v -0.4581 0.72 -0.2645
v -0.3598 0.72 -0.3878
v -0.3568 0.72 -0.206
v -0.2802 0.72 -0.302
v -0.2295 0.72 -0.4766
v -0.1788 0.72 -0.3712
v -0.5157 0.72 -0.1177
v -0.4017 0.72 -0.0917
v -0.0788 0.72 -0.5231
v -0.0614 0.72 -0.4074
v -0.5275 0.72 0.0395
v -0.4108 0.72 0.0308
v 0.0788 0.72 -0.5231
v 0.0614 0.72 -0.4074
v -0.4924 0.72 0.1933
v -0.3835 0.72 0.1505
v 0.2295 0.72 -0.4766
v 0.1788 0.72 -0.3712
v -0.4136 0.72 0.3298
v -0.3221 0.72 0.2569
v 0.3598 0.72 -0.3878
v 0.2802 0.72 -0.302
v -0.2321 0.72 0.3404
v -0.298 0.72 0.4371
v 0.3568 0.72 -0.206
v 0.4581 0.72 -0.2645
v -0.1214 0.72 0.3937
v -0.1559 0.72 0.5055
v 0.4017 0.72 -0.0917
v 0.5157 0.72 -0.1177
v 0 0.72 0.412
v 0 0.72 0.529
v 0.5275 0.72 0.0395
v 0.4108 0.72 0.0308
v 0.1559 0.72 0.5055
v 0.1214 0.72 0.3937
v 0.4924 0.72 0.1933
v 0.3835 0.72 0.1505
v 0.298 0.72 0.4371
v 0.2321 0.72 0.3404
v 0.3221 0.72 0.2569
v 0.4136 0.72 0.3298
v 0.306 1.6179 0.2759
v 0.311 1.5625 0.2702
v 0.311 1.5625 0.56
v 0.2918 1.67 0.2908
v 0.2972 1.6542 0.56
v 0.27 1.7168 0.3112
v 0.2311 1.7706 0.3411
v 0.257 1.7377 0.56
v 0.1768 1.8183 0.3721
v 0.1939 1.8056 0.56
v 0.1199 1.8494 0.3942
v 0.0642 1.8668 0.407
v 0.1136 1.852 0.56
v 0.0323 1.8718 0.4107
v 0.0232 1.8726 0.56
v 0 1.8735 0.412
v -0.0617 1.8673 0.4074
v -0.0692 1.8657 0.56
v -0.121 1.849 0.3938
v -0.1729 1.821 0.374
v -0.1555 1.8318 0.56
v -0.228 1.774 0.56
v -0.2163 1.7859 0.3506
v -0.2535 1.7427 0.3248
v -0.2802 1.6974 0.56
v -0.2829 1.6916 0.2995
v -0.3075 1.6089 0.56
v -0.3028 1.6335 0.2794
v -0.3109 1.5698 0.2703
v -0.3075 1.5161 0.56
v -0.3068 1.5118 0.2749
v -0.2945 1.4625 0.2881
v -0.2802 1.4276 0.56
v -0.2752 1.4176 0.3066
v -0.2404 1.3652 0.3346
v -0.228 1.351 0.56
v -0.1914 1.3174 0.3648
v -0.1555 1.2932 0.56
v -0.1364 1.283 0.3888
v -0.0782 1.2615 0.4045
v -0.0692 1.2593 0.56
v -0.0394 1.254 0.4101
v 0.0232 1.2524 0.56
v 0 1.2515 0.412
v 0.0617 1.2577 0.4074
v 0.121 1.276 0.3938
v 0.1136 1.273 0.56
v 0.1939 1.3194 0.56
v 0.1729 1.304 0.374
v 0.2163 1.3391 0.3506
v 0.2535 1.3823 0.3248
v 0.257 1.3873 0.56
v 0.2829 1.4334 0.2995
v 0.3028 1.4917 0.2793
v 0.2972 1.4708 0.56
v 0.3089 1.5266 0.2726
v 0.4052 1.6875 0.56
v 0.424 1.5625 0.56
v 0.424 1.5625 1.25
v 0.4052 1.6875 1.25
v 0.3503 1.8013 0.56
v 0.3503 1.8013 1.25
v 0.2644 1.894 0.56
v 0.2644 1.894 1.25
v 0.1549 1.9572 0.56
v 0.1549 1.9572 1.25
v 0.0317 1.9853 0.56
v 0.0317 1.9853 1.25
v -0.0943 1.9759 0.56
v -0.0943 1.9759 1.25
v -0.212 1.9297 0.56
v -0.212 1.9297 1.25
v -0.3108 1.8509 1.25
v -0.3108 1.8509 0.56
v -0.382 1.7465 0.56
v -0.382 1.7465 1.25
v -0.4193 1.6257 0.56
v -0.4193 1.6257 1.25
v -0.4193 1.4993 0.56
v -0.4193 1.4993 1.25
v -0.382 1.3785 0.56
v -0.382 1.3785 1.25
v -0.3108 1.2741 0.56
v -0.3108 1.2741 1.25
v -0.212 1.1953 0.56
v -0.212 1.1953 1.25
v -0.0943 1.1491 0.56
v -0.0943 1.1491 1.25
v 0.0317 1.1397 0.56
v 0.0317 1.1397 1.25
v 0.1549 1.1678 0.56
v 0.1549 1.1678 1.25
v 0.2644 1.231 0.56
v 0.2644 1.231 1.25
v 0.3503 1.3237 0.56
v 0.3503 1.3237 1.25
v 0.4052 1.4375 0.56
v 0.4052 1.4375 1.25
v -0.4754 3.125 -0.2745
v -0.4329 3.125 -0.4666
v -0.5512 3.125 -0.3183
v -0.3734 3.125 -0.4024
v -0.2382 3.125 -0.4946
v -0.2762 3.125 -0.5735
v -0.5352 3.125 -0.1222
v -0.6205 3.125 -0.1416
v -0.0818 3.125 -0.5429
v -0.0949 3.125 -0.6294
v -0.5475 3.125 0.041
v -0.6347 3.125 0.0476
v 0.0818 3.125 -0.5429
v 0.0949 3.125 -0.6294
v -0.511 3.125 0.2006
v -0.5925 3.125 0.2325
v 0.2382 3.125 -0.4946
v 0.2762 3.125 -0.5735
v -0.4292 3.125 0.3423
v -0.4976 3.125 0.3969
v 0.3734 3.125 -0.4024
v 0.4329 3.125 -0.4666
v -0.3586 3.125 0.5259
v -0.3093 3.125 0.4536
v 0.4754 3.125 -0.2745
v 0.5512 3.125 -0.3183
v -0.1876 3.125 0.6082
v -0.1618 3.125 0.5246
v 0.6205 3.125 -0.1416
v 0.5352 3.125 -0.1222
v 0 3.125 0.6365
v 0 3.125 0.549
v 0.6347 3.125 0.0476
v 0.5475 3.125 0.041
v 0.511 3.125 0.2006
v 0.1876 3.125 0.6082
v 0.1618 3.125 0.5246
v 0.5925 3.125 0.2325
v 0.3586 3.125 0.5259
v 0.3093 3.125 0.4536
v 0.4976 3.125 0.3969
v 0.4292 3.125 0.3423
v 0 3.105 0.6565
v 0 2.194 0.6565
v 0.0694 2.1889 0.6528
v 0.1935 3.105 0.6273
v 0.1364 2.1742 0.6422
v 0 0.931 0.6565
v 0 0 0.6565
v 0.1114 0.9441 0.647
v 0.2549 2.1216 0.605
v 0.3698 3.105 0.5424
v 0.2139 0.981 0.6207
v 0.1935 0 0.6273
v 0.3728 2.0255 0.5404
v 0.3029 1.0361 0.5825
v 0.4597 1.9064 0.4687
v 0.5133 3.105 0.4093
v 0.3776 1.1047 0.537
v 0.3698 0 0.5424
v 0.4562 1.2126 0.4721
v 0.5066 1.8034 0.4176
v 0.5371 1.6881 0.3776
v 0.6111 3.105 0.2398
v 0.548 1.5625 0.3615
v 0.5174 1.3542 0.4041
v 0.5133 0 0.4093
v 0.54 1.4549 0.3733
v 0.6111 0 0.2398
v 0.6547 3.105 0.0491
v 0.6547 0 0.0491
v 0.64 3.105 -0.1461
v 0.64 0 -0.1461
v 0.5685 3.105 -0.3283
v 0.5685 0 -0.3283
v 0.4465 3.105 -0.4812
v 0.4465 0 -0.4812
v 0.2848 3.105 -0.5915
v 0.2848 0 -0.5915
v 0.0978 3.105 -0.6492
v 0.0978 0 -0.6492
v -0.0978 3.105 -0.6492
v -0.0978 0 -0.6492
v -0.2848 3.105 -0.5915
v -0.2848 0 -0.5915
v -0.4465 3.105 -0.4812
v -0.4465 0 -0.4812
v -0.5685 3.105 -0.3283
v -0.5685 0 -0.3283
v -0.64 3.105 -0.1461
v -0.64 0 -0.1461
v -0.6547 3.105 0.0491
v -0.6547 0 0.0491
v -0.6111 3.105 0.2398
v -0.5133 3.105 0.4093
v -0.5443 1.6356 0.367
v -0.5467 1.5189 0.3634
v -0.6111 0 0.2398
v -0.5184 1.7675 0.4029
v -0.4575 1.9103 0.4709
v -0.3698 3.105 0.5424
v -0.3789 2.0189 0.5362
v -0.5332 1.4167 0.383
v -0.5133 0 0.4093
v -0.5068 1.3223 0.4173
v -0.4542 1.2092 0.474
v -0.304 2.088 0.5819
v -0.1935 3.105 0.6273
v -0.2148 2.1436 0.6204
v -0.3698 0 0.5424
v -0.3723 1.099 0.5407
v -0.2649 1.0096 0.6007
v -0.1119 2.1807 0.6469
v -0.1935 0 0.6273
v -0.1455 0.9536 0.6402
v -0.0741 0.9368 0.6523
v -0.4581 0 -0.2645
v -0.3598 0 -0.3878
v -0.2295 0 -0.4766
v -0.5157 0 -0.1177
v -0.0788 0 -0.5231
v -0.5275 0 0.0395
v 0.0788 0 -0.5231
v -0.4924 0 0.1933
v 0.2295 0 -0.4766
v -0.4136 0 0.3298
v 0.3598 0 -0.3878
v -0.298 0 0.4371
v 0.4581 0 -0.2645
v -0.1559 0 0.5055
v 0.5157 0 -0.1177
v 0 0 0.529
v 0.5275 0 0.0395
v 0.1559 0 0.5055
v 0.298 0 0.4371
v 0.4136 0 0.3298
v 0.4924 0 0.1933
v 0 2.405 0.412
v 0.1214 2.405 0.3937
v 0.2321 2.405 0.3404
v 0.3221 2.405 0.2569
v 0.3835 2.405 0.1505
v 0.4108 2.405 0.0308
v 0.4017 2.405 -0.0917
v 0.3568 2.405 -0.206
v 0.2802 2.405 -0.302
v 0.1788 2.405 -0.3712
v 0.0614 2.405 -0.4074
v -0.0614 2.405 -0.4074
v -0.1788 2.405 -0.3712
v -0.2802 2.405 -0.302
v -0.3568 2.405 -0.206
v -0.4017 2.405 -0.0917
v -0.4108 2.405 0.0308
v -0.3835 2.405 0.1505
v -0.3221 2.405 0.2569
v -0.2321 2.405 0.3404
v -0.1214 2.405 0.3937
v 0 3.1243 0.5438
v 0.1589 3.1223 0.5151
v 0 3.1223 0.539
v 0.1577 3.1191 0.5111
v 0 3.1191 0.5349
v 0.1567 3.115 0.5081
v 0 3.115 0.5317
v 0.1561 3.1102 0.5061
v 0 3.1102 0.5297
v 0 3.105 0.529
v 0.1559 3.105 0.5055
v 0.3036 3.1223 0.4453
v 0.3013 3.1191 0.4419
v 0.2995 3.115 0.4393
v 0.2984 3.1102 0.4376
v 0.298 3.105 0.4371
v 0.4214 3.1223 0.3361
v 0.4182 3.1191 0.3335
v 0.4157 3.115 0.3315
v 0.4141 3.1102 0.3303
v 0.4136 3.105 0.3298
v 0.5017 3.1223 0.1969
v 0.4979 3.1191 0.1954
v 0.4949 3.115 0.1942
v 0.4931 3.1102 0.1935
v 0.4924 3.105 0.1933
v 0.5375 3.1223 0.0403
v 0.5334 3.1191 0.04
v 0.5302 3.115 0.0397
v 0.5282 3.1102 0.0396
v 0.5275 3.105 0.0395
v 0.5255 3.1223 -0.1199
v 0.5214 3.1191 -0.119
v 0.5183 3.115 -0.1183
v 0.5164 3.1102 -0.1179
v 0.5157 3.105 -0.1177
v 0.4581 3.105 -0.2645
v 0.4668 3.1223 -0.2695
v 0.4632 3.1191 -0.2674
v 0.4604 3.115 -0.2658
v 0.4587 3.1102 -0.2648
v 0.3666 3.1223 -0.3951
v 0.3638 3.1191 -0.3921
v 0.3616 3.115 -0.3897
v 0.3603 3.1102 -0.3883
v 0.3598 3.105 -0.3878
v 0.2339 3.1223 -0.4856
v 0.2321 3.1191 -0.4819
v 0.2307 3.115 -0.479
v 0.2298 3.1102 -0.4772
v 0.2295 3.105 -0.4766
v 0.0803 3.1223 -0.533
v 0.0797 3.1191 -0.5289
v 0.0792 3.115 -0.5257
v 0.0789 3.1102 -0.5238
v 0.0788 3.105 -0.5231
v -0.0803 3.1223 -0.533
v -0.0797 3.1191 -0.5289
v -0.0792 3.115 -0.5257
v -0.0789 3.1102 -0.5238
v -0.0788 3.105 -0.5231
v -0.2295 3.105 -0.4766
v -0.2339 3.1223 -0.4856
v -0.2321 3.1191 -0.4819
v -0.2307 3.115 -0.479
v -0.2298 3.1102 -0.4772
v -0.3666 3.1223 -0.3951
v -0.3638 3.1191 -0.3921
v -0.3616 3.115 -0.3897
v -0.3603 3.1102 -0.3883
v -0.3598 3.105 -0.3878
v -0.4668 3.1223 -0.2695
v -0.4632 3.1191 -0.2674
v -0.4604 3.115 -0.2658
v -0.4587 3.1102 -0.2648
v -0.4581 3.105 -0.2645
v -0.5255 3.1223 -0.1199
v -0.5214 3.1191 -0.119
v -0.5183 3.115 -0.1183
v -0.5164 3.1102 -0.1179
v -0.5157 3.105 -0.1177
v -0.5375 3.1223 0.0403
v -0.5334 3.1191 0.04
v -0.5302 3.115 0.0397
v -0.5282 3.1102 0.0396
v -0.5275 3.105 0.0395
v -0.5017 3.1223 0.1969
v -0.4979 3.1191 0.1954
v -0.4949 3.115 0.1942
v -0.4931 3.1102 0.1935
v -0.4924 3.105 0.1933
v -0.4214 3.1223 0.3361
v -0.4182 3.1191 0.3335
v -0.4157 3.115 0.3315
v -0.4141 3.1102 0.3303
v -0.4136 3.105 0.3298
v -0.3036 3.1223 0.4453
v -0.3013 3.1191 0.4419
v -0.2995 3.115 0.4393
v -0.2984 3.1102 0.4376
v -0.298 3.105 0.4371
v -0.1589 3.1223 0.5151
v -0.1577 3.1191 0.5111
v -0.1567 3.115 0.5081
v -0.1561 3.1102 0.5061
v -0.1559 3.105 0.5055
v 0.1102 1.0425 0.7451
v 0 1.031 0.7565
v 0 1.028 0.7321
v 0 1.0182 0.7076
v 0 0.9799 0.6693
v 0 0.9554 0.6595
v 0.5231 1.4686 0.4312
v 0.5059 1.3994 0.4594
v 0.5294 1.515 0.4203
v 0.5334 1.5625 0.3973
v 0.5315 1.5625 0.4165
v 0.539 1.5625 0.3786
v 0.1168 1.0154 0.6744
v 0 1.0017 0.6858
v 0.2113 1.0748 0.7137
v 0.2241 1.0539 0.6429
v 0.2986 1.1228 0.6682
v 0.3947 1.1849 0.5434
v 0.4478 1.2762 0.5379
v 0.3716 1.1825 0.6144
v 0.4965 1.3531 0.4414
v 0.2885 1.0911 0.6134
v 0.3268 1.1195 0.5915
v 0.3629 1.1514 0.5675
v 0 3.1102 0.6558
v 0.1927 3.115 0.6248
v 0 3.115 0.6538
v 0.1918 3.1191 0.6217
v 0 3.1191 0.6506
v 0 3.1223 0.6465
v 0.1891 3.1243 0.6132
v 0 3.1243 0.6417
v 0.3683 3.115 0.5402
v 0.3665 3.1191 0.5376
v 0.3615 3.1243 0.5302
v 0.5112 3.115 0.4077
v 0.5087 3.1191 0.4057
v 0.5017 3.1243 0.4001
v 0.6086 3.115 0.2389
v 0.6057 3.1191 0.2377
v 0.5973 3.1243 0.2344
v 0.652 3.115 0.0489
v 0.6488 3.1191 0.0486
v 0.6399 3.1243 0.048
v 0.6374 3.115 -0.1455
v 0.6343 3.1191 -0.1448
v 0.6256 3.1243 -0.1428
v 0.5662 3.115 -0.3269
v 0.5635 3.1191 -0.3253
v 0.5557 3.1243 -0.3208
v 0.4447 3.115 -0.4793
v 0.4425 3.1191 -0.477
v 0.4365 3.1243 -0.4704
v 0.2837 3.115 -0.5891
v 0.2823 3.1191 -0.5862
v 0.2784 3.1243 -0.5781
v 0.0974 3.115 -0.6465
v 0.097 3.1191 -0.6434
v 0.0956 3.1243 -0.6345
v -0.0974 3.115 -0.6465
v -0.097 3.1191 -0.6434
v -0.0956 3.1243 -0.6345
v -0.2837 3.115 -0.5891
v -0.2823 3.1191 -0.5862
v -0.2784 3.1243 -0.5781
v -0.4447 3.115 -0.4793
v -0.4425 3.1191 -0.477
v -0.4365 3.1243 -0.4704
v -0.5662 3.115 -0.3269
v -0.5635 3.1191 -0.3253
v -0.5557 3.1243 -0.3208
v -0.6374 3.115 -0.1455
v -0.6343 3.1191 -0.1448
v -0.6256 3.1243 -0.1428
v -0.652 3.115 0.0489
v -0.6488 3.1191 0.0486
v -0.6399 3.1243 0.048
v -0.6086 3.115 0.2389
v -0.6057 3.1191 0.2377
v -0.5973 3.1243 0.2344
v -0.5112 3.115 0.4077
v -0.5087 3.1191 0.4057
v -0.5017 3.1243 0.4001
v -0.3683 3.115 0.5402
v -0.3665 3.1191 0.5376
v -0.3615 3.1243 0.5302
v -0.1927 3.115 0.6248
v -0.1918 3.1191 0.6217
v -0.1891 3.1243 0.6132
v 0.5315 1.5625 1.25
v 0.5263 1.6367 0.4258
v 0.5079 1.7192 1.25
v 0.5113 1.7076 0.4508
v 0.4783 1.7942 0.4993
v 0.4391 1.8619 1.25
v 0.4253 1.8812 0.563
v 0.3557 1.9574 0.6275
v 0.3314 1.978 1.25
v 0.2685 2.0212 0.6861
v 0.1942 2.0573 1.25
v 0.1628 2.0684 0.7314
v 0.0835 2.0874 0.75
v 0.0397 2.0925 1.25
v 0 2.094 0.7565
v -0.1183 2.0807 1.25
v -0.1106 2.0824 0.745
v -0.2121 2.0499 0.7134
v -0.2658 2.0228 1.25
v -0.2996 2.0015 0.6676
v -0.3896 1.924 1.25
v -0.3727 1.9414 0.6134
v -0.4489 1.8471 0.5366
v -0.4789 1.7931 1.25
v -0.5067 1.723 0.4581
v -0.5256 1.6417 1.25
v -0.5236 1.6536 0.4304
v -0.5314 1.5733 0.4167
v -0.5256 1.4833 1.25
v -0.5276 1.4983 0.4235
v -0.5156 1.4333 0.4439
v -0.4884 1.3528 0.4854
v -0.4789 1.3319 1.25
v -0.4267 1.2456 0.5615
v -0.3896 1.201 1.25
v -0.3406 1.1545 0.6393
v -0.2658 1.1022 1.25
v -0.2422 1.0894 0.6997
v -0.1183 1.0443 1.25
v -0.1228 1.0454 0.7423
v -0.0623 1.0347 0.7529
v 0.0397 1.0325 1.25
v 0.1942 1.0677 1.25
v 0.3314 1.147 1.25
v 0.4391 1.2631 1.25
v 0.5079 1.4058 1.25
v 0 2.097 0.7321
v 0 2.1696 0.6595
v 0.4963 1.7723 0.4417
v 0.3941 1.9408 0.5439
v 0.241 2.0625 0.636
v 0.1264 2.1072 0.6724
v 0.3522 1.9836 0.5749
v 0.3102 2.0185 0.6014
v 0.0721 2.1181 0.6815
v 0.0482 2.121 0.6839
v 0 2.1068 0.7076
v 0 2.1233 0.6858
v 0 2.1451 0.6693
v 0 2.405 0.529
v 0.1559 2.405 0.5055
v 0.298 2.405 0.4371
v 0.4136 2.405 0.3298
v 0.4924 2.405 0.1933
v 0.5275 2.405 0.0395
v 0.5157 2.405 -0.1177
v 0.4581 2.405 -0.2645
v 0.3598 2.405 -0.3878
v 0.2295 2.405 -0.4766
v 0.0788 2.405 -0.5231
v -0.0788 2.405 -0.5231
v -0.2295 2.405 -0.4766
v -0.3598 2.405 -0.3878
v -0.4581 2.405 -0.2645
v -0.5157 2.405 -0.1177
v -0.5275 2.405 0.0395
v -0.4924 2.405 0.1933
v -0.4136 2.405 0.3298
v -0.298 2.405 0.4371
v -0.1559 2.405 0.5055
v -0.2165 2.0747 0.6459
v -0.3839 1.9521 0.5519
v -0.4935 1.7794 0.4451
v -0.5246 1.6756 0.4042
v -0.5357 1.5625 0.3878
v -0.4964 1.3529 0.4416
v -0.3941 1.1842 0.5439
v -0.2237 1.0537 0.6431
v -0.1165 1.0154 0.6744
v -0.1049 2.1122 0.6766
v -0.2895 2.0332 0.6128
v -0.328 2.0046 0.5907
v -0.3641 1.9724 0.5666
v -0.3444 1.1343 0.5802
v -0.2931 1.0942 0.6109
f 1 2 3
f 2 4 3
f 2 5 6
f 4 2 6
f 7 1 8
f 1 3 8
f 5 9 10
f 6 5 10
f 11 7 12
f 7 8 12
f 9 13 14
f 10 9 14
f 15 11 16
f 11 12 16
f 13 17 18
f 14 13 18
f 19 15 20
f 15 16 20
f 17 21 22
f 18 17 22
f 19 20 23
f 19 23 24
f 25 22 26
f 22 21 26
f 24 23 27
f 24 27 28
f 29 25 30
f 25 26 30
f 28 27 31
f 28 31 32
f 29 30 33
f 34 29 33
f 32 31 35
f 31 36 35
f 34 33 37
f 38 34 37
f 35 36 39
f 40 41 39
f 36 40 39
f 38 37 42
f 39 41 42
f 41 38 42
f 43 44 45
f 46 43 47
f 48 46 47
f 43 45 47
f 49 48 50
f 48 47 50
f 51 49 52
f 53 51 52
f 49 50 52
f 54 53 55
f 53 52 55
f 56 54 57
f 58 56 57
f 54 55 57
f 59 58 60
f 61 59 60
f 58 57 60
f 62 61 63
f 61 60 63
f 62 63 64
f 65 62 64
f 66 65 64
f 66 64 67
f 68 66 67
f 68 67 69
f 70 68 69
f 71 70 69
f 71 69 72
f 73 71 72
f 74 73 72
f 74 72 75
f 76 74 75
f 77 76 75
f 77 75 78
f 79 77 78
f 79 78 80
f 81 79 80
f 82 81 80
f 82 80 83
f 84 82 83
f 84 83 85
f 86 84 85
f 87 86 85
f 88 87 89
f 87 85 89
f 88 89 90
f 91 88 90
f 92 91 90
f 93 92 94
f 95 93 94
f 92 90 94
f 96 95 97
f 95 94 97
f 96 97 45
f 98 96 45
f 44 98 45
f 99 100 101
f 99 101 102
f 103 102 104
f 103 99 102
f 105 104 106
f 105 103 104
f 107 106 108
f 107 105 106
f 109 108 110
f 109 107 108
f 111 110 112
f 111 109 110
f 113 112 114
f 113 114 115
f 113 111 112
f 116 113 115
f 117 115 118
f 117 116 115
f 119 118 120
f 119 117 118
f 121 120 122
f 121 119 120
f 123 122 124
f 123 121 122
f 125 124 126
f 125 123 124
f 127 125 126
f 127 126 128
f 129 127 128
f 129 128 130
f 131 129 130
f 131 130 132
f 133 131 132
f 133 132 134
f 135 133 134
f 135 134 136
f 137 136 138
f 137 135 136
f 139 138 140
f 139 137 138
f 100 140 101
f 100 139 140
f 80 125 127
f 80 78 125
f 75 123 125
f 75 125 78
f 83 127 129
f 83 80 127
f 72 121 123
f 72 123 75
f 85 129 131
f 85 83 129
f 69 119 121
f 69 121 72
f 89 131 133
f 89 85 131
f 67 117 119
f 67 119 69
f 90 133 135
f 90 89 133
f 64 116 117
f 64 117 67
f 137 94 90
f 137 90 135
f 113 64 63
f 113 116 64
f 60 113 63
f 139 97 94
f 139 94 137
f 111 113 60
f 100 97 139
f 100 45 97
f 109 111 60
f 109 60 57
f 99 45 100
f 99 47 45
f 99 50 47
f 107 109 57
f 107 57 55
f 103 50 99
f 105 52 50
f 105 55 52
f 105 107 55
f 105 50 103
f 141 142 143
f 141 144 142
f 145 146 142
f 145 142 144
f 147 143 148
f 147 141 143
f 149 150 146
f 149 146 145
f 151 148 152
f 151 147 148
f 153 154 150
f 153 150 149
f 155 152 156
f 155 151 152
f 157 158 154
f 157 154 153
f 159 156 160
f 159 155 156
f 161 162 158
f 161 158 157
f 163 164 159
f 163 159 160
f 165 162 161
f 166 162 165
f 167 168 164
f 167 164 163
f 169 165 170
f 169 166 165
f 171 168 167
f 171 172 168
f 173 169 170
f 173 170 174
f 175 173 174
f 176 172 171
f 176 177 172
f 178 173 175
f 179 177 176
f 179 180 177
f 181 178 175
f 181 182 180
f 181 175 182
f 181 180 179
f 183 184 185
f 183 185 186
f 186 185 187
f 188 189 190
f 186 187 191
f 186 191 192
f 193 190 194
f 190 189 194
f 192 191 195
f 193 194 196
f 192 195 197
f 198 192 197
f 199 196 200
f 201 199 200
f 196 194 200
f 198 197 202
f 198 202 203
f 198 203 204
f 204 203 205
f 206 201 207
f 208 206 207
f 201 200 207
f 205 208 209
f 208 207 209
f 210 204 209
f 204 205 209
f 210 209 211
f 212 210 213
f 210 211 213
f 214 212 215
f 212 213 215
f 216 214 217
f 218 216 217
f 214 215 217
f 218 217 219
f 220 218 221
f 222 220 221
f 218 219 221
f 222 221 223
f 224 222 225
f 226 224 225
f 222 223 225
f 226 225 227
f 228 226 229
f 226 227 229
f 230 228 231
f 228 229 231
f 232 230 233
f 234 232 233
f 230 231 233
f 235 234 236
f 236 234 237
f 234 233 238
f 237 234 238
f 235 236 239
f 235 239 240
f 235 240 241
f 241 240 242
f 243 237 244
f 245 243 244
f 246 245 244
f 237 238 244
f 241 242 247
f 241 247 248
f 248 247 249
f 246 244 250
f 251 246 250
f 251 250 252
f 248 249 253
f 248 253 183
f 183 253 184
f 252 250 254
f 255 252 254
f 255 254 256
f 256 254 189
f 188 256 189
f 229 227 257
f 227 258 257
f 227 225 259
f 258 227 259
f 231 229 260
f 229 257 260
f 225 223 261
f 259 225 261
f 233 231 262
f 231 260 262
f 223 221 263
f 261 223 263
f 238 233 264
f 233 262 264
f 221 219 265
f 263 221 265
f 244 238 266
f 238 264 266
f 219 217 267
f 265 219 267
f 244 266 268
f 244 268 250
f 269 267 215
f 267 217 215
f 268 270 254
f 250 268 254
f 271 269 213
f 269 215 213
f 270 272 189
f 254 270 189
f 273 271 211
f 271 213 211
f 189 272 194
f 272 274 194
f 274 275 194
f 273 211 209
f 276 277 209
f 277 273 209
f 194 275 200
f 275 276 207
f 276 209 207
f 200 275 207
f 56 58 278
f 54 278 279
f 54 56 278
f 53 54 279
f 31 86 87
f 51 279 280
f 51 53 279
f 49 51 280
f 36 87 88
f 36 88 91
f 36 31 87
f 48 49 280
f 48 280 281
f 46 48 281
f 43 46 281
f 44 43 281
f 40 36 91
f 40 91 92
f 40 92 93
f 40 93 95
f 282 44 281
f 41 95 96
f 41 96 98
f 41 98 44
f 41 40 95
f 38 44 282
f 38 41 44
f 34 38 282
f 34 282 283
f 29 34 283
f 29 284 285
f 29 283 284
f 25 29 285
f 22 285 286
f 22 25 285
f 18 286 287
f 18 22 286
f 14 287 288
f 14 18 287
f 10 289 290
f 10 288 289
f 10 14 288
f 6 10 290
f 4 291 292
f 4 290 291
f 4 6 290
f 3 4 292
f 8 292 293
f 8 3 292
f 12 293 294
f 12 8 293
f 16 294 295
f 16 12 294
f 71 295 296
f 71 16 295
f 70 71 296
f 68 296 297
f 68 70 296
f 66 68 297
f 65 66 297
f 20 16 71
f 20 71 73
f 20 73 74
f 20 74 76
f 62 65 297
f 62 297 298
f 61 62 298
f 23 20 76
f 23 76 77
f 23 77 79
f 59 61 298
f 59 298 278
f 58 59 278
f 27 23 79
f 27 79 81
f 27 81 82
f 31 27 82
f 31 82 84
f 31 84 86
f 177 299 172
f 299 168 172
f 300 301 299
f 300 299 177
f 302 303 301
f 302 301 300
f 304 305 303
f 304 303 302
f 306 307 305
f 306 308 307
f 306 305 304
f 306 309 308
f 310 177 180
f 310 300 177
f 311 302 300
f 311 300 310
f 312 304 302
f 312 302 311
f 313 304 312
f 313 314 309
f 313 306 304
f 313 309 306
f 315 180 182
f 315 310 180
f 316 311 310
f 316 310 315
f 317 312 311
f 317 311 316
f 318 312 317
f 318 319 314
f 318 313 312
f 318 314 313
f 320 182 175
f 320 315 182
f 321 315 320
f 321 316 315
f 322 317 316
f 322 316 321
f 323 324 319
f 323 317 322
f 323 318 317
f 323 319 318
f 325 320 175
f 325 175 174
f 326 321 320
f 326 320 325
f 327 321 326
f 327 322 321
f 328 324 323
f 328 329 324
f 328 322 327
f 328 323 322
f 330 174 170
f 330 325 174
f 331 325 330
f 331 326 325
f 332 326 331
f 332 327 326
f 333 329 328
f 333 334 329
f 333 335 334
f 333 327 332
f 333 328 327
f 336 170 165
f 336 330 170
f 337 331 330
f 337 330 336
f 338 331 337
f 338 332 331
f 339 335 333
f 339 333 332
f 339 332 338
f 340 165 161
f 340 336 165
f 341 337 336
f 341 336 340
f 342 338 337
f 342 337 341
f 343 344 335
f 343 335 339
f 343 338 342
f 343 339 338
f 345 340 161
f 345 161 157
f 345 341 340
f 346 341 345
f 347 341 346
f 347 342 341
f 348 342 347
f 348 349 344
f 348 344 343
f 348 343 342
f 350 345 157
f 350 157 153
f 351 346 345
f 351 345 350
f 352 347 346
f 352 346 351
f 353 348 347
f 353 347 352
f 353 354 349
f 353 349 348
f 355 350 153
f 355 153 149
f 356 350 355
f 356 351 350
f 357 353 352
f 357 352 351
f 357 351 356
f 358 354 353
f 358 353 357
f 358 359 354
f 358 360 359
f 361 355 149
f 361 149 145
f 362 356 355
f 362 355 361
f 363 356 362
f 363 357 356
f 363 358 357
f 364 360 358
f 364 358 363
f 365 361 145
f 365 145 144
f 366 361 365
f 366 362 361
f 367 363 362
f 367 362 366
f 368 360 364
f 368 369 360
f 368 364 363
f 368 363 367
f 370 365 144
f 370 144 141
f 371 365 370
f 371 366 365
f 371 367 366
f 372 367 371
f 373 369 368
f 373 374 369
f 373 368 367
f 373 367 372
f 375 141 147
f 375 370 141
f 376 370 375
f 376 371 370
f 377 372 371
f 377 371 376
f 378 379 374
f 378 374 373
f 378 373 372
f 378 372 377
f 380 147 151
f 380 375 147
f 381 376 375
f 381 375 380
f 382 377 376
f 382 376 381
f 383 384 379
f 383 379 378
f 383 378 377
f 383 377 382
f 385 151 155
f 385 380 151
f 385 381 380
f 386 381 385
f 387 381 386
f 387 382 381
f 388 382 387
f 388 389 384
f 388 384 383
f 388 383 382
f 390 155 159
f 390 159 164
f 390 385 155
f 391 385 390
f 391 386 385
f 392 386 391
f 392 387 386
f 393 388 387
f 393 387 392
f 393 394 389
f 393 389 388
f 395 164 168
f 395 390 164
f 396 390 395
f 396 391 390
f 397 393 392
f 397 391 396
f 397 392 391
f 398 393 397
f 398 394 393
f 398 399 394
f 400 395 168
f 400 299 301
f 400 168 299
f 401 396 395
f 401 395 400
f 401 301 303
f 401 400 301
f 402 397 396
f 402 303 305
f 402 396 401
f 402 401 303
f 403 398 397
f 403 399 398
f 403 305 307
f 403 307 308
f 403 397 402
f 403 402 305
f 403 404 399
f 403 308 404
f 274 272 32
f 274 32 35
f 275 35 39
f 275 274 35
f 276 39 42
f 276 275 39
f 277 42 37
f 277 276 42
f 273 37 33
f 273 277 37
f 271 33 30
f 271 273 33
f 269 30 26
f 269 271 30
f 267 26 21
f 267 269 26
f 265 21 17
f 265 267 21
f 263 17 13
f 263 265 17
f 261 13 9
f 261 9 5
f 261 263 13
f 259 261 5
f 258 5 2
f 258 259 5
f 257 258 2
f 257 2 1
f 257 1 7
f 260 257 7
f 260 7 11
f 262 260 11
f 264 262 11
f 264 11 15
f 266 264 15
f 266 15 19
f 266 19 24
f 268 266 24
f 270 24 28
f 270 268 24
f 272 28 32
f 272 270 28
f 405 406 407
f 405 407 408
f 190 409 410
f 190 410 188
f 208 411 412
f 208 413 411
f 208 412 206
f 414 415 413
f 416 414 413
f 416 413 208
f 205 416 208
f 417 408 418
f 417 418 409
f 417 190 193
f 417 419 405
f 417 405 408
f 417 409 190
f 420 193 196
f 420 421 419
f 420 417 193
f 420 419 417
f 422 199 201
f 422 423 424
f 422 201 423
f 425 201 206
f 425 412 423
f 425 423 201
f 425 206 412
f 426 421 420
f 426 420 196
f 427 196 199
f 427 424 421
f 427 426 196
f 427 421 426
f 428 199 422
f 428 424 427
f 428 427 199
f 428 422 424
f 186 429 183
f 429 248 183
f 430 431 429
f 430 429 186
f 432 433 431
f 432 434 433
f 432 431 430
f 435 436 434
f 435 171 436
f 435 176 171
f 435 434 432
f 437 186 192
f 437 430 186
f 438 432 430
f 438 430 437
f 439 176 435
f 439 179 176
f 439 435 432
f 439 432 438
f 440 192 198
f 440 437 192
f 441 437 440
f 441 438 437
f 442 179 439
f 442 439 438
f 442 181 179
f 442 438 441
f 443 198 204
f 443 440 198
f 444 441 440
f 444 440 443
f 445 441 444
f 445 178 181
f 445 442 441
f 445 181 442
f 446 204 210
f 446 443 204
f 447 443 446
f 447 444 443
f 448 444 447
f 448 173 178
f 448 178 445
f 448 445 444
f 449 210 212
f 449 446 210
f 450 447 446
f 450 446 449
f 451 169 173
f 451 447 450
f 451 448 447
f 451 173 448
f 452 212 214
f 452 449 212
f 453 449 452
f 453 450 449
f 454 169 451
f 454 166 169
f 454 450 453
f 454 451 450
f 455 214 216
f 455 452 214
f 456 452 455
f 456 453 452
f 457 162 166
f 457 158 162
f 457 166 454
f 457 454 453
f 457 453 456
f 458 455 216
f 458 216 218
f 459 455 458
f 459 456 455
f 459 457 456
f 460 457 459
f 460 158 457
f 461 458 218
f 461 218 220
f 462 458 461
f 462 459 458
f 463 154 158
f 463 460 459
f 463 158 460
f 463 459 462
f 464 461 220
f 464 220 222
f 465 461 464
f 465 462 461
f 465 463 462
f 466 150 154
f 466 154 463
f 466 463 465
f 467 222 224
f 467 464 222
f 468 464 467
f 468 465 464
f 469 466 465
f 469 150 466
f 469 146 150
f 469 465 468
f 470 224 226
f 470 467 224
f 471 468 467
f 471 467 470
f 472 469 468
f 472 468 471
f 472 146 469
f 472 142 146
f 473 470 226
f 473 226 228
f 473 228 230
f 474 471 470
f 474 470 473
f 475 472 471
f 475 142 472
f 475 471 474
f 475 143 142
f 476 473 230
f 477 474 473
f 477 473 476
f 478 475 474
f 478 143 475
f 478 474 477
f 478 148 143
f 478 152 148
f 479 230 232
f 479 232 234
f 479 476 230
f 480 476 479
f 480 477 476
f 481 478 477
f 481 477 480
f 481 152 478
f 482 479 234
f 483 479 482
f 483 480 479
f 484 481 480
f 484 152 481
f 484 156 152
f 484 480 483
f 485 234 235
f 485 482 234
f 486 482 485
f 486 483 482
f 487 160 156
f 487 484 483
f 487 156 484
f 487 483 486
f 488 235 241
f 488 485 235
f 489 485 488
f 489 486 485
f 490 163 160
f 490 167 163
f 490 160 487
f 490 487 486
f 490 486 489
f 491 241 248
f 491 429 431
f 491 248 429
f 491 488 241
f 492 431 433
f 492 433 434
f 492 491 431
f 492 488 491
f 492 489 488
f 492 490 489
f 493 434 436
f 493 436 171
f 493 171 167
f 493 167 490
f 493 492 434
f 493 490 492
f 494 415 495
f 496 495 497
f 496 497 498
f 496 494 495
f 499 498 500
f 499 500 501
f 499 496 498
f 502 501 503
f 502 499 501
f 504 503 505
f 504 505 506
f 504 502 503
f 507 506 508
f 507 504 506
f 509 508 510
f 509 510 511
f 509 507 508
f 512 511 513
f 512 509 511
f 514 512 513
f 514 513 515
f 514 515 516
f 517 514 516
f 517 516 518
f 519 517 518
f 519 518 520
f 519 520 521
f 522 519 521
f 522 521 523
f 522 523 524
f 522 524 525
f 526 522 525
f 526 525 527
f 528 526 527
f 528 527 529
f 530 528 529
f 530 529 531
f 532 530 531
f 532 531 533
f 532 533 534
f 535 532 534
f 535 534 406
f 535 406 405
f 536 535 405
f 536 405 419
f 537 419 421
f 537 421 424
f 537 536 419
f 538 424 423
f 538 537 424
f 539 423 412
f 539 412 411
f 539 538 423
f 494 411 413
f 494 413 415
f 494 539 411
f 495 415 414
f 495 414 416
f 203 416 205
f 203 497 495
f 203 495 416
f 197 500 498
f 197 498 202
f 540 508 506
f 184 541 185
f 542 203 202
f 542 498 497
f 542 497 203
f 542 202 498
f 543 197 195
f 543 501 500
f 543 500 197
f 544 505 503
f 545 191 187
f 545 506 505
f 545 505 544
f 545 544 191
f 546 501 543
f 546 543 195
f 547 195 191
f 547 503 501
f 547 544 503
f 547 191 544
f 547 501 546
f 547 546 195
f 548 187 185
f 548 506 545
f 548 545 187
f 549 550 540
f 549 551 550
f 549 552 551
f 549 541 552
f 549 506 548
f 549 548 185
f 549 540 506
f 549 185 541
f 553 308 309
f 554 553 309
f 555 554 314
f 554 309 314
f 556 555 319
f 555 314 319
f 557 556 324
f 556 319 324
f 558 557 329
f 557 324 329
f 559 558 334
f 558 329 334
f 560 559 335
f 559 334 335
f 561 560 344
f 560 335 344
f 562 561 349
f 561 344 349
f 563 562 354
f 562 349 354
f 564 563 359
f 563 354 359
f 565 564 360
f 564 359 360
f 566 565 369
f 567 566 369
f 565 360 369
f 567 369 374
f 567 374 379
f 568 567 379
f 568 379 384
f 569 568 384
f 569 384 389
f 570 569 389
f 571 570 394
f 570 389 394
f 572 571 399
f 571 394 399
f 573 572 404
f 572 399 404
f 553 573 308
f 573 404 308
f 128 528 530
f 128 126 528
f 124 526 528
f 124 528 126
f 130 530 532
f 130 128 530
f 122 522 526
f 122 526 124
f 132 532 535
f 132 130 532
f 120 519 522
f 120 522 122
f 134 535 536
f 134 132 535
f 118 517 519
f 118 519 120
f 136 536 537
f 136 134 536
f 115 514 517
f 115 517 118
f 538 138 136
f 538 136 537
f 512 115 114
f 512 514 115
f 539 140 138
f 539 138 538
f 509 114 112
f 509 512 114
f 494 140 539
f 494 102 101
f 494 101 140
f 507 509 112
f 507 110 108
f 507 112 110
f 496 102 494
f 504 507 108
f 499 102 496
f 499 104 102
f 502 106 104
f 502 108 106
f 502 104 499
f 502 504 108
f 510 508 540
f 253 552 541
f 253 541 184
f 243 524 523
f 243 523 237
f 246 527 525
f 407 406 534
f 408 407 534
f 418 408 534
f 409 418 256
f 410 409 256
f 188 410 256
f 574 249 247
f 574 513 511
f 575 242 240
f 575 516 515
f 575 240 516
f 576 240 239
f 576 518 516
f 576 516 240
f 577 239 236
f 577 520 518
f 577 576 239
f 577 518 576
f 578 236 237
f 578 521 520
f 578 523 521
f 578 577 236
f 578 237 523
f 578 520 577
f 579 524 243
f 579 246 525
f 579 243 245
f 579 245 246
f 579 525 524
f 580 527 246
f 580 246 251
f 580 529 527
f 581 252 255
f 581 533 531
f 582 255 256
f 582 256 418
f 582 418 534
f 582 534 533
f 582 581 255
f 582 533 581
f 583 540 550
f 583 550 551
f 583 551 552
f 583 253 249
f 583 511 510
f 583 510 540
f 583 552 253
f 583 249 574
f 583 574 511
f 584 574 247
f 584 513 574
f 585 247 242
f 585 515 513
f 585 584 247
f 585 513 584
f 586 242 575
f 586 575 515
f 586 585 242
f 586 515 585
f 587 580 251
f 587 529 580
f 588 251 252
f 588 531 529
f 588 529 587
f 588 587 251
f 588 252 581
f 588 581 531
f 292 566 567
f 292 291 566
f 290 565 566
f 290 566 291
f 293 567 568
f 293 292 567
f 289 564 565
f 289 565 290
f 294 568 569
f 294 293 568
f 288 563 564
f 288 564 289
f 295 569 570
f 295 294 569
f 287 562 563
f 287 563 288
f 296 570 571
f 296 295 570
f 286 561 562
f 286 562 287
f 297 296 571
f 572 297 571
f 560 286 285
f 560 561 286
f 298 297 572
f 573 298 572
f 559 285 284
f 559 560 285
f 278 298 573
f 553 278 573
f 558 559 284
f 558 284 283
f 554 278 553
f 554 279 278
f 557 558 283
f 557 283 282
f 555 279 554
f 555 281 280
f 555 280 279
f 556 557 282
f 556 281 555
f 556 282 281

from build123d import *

# Parameters (mm, degrees)
SKETCH3_R                = 0.6565
SKETCH3_R_2              = 0.412
BOSS_EXTRUDE1_DEPTH      = 3.125
SKETCH4_R                = 0.529
CUT_EXTRUDE1_DEPTH       = 0.72
BOSS_EXTRUDE2_REACH      = 5.719
BOSS_EXTRUDE2_END_RADIUS = 0.6565
SKETCH6_R                = 0.5315
FILLET1_R                = 0.1
CUT_EXTRUDE3_START       = 0.56
CUT_EXTRUDE3_OUTLINE_R   = 0.424
CUT_EXTRUDE3_DEPTH       = 0.69
CUT_EXTRUDE4_REACH       = 5.719
CUT_EXTRUDE4_END_RADIUS  = 0.412
SKETCH8_R                = 0.311
FILLET3_R                = 0.02


# Read off the part's stored shape, not the designer's step: Cut-Extrude3
with BuildPart() as part:
    # Sketch3 → Boss-Extrude1 (new body)
    with BuildSketch(Plane(origin=(0, 0, 0), x_dir=(1, 0, 0), z_dir=(0, 1, 0))):
        with Locations(Location((0, 0, 0), (0, 0, 270))):
            Circle(SKETCH3_R)
        with Locations(Location((0, 0, 0), (0, 0, 270))):
            Circle(SKETCH3_R_2, mode=Mode.SUBTRACT)
    extrude(amount=BOSS_EXTRUDE1_DEPTH)

    # Sketch4 → Cut-Extrude1 (cut)
    with BuildSketch(Plane(origin=(0, 3.125, 0), x_dir=(1, 0, 0), z_dir=(0, 1, 0))):
        with Locations(Location((0, 0, 0), (0, 0, 270))):
            Circle(SKETCH4_R)
    cut_extrude1 = extrude(amount=-CUT_EXTRUDE1_DEPTH, mode=Mode.SUBTRACT)

    # Mirror1: Cut-Extrude1 across plane
    add(cut_extrude1.mirror(Plane.ZX.offset(1.5625)), mode=Mode.SUBTRACT)

    # Boss-Extrude2: up to this cylinder (the profile starts outside it)
    boss_extrude2_end = Plane(origin=(0, 1.5625, 0), z_dir=(0, -1, 0)) * Cylinder(BOSS_EXTRUDE2_END_RADIUS, 13.751, mode=Mode.PRIVATE)
    # Sketch6 → Boss-Extrude2 (add, up to the surface)
    with BuildSketch(Plane.XY.offset(1.25), mode=Mode.PRIVATE) as boss_extrude2_sk1:
        with Locations((0, 1.5625)):
            Circle(SKETCH6_R)
    boss_extrude2_tool1 = extrude(boss_extrude2_sk1.sketch, amount=-BOSS_EXTRUDE2_REACH, mode=Mode.PRIVATE) - boss_extrude2_end
    add(boss_extrude2_tool1.solids().sort_by_distance((0, 1.5625, 1.25))[0])

    # Fillet1
    fillet1_edges = [part.edges().sort_by_distance(p)[0] for p in [
        (-0.5315, 1.5625, 0.385356977),
    ]]
    fillet(fillet1_edges, radius=FILLET1_R)

    # Cut-Extrude3 outline → Cut-Extrude3 (cut)
    with BuildSketch(Plane.XY.offset(CUT_EXTRUDE3_START)):
        with Locations((0, 1.5625)):
            Circle(CUT_EXTRUDE3_OUTLINE_R)
    extrude(amount=CUT_EXTRUDE3_DEPTH, mode=Mode.SUBTRACT)

    # Cut-Extrude4: up to this cylinder (the profile starts outside it)
    cut_extrude4_end = Plane(origin=(0, 1.5625, 0), z_dir=(0, -1, 0)) * Cylinder(CUT_EXTRUDE4_END_RADIUS, 13.262, mode=Mode.PRIVATE)
    # Sketch8 → Cut-Extrude4 (cut, up to the surface)
    with BuildSketch(Plane.XY.offset(1.25), mode=Mode.PRIVATE) as cut_extrude4_sk1:
        with Locations((0, 1.5625)):
            Circle(SKETCH8_R)
    cut_extrude4_tool1 = extrude(cut_extrude4_sk1.sketch, amount=-CUT_EXTRUDE4_REACH, mode=Mode.PRIVATE) - cut_extrude4_end
    add(cut_extrude4_tool1.solids().sort_by_distance((0, 1.5625, 1.25))[0], mode=Mode.SUBTRACT)

    # Fillet3
    fillet3_edges = [part.edges().sort_by_distance(p)[0] for p in [
        (0, 3.125, -0.529),
        (0, 3.125, -0.6565),
    ]]
    fillet(fillet3_edges, radius=FILLET3_R)


solid = part.part
